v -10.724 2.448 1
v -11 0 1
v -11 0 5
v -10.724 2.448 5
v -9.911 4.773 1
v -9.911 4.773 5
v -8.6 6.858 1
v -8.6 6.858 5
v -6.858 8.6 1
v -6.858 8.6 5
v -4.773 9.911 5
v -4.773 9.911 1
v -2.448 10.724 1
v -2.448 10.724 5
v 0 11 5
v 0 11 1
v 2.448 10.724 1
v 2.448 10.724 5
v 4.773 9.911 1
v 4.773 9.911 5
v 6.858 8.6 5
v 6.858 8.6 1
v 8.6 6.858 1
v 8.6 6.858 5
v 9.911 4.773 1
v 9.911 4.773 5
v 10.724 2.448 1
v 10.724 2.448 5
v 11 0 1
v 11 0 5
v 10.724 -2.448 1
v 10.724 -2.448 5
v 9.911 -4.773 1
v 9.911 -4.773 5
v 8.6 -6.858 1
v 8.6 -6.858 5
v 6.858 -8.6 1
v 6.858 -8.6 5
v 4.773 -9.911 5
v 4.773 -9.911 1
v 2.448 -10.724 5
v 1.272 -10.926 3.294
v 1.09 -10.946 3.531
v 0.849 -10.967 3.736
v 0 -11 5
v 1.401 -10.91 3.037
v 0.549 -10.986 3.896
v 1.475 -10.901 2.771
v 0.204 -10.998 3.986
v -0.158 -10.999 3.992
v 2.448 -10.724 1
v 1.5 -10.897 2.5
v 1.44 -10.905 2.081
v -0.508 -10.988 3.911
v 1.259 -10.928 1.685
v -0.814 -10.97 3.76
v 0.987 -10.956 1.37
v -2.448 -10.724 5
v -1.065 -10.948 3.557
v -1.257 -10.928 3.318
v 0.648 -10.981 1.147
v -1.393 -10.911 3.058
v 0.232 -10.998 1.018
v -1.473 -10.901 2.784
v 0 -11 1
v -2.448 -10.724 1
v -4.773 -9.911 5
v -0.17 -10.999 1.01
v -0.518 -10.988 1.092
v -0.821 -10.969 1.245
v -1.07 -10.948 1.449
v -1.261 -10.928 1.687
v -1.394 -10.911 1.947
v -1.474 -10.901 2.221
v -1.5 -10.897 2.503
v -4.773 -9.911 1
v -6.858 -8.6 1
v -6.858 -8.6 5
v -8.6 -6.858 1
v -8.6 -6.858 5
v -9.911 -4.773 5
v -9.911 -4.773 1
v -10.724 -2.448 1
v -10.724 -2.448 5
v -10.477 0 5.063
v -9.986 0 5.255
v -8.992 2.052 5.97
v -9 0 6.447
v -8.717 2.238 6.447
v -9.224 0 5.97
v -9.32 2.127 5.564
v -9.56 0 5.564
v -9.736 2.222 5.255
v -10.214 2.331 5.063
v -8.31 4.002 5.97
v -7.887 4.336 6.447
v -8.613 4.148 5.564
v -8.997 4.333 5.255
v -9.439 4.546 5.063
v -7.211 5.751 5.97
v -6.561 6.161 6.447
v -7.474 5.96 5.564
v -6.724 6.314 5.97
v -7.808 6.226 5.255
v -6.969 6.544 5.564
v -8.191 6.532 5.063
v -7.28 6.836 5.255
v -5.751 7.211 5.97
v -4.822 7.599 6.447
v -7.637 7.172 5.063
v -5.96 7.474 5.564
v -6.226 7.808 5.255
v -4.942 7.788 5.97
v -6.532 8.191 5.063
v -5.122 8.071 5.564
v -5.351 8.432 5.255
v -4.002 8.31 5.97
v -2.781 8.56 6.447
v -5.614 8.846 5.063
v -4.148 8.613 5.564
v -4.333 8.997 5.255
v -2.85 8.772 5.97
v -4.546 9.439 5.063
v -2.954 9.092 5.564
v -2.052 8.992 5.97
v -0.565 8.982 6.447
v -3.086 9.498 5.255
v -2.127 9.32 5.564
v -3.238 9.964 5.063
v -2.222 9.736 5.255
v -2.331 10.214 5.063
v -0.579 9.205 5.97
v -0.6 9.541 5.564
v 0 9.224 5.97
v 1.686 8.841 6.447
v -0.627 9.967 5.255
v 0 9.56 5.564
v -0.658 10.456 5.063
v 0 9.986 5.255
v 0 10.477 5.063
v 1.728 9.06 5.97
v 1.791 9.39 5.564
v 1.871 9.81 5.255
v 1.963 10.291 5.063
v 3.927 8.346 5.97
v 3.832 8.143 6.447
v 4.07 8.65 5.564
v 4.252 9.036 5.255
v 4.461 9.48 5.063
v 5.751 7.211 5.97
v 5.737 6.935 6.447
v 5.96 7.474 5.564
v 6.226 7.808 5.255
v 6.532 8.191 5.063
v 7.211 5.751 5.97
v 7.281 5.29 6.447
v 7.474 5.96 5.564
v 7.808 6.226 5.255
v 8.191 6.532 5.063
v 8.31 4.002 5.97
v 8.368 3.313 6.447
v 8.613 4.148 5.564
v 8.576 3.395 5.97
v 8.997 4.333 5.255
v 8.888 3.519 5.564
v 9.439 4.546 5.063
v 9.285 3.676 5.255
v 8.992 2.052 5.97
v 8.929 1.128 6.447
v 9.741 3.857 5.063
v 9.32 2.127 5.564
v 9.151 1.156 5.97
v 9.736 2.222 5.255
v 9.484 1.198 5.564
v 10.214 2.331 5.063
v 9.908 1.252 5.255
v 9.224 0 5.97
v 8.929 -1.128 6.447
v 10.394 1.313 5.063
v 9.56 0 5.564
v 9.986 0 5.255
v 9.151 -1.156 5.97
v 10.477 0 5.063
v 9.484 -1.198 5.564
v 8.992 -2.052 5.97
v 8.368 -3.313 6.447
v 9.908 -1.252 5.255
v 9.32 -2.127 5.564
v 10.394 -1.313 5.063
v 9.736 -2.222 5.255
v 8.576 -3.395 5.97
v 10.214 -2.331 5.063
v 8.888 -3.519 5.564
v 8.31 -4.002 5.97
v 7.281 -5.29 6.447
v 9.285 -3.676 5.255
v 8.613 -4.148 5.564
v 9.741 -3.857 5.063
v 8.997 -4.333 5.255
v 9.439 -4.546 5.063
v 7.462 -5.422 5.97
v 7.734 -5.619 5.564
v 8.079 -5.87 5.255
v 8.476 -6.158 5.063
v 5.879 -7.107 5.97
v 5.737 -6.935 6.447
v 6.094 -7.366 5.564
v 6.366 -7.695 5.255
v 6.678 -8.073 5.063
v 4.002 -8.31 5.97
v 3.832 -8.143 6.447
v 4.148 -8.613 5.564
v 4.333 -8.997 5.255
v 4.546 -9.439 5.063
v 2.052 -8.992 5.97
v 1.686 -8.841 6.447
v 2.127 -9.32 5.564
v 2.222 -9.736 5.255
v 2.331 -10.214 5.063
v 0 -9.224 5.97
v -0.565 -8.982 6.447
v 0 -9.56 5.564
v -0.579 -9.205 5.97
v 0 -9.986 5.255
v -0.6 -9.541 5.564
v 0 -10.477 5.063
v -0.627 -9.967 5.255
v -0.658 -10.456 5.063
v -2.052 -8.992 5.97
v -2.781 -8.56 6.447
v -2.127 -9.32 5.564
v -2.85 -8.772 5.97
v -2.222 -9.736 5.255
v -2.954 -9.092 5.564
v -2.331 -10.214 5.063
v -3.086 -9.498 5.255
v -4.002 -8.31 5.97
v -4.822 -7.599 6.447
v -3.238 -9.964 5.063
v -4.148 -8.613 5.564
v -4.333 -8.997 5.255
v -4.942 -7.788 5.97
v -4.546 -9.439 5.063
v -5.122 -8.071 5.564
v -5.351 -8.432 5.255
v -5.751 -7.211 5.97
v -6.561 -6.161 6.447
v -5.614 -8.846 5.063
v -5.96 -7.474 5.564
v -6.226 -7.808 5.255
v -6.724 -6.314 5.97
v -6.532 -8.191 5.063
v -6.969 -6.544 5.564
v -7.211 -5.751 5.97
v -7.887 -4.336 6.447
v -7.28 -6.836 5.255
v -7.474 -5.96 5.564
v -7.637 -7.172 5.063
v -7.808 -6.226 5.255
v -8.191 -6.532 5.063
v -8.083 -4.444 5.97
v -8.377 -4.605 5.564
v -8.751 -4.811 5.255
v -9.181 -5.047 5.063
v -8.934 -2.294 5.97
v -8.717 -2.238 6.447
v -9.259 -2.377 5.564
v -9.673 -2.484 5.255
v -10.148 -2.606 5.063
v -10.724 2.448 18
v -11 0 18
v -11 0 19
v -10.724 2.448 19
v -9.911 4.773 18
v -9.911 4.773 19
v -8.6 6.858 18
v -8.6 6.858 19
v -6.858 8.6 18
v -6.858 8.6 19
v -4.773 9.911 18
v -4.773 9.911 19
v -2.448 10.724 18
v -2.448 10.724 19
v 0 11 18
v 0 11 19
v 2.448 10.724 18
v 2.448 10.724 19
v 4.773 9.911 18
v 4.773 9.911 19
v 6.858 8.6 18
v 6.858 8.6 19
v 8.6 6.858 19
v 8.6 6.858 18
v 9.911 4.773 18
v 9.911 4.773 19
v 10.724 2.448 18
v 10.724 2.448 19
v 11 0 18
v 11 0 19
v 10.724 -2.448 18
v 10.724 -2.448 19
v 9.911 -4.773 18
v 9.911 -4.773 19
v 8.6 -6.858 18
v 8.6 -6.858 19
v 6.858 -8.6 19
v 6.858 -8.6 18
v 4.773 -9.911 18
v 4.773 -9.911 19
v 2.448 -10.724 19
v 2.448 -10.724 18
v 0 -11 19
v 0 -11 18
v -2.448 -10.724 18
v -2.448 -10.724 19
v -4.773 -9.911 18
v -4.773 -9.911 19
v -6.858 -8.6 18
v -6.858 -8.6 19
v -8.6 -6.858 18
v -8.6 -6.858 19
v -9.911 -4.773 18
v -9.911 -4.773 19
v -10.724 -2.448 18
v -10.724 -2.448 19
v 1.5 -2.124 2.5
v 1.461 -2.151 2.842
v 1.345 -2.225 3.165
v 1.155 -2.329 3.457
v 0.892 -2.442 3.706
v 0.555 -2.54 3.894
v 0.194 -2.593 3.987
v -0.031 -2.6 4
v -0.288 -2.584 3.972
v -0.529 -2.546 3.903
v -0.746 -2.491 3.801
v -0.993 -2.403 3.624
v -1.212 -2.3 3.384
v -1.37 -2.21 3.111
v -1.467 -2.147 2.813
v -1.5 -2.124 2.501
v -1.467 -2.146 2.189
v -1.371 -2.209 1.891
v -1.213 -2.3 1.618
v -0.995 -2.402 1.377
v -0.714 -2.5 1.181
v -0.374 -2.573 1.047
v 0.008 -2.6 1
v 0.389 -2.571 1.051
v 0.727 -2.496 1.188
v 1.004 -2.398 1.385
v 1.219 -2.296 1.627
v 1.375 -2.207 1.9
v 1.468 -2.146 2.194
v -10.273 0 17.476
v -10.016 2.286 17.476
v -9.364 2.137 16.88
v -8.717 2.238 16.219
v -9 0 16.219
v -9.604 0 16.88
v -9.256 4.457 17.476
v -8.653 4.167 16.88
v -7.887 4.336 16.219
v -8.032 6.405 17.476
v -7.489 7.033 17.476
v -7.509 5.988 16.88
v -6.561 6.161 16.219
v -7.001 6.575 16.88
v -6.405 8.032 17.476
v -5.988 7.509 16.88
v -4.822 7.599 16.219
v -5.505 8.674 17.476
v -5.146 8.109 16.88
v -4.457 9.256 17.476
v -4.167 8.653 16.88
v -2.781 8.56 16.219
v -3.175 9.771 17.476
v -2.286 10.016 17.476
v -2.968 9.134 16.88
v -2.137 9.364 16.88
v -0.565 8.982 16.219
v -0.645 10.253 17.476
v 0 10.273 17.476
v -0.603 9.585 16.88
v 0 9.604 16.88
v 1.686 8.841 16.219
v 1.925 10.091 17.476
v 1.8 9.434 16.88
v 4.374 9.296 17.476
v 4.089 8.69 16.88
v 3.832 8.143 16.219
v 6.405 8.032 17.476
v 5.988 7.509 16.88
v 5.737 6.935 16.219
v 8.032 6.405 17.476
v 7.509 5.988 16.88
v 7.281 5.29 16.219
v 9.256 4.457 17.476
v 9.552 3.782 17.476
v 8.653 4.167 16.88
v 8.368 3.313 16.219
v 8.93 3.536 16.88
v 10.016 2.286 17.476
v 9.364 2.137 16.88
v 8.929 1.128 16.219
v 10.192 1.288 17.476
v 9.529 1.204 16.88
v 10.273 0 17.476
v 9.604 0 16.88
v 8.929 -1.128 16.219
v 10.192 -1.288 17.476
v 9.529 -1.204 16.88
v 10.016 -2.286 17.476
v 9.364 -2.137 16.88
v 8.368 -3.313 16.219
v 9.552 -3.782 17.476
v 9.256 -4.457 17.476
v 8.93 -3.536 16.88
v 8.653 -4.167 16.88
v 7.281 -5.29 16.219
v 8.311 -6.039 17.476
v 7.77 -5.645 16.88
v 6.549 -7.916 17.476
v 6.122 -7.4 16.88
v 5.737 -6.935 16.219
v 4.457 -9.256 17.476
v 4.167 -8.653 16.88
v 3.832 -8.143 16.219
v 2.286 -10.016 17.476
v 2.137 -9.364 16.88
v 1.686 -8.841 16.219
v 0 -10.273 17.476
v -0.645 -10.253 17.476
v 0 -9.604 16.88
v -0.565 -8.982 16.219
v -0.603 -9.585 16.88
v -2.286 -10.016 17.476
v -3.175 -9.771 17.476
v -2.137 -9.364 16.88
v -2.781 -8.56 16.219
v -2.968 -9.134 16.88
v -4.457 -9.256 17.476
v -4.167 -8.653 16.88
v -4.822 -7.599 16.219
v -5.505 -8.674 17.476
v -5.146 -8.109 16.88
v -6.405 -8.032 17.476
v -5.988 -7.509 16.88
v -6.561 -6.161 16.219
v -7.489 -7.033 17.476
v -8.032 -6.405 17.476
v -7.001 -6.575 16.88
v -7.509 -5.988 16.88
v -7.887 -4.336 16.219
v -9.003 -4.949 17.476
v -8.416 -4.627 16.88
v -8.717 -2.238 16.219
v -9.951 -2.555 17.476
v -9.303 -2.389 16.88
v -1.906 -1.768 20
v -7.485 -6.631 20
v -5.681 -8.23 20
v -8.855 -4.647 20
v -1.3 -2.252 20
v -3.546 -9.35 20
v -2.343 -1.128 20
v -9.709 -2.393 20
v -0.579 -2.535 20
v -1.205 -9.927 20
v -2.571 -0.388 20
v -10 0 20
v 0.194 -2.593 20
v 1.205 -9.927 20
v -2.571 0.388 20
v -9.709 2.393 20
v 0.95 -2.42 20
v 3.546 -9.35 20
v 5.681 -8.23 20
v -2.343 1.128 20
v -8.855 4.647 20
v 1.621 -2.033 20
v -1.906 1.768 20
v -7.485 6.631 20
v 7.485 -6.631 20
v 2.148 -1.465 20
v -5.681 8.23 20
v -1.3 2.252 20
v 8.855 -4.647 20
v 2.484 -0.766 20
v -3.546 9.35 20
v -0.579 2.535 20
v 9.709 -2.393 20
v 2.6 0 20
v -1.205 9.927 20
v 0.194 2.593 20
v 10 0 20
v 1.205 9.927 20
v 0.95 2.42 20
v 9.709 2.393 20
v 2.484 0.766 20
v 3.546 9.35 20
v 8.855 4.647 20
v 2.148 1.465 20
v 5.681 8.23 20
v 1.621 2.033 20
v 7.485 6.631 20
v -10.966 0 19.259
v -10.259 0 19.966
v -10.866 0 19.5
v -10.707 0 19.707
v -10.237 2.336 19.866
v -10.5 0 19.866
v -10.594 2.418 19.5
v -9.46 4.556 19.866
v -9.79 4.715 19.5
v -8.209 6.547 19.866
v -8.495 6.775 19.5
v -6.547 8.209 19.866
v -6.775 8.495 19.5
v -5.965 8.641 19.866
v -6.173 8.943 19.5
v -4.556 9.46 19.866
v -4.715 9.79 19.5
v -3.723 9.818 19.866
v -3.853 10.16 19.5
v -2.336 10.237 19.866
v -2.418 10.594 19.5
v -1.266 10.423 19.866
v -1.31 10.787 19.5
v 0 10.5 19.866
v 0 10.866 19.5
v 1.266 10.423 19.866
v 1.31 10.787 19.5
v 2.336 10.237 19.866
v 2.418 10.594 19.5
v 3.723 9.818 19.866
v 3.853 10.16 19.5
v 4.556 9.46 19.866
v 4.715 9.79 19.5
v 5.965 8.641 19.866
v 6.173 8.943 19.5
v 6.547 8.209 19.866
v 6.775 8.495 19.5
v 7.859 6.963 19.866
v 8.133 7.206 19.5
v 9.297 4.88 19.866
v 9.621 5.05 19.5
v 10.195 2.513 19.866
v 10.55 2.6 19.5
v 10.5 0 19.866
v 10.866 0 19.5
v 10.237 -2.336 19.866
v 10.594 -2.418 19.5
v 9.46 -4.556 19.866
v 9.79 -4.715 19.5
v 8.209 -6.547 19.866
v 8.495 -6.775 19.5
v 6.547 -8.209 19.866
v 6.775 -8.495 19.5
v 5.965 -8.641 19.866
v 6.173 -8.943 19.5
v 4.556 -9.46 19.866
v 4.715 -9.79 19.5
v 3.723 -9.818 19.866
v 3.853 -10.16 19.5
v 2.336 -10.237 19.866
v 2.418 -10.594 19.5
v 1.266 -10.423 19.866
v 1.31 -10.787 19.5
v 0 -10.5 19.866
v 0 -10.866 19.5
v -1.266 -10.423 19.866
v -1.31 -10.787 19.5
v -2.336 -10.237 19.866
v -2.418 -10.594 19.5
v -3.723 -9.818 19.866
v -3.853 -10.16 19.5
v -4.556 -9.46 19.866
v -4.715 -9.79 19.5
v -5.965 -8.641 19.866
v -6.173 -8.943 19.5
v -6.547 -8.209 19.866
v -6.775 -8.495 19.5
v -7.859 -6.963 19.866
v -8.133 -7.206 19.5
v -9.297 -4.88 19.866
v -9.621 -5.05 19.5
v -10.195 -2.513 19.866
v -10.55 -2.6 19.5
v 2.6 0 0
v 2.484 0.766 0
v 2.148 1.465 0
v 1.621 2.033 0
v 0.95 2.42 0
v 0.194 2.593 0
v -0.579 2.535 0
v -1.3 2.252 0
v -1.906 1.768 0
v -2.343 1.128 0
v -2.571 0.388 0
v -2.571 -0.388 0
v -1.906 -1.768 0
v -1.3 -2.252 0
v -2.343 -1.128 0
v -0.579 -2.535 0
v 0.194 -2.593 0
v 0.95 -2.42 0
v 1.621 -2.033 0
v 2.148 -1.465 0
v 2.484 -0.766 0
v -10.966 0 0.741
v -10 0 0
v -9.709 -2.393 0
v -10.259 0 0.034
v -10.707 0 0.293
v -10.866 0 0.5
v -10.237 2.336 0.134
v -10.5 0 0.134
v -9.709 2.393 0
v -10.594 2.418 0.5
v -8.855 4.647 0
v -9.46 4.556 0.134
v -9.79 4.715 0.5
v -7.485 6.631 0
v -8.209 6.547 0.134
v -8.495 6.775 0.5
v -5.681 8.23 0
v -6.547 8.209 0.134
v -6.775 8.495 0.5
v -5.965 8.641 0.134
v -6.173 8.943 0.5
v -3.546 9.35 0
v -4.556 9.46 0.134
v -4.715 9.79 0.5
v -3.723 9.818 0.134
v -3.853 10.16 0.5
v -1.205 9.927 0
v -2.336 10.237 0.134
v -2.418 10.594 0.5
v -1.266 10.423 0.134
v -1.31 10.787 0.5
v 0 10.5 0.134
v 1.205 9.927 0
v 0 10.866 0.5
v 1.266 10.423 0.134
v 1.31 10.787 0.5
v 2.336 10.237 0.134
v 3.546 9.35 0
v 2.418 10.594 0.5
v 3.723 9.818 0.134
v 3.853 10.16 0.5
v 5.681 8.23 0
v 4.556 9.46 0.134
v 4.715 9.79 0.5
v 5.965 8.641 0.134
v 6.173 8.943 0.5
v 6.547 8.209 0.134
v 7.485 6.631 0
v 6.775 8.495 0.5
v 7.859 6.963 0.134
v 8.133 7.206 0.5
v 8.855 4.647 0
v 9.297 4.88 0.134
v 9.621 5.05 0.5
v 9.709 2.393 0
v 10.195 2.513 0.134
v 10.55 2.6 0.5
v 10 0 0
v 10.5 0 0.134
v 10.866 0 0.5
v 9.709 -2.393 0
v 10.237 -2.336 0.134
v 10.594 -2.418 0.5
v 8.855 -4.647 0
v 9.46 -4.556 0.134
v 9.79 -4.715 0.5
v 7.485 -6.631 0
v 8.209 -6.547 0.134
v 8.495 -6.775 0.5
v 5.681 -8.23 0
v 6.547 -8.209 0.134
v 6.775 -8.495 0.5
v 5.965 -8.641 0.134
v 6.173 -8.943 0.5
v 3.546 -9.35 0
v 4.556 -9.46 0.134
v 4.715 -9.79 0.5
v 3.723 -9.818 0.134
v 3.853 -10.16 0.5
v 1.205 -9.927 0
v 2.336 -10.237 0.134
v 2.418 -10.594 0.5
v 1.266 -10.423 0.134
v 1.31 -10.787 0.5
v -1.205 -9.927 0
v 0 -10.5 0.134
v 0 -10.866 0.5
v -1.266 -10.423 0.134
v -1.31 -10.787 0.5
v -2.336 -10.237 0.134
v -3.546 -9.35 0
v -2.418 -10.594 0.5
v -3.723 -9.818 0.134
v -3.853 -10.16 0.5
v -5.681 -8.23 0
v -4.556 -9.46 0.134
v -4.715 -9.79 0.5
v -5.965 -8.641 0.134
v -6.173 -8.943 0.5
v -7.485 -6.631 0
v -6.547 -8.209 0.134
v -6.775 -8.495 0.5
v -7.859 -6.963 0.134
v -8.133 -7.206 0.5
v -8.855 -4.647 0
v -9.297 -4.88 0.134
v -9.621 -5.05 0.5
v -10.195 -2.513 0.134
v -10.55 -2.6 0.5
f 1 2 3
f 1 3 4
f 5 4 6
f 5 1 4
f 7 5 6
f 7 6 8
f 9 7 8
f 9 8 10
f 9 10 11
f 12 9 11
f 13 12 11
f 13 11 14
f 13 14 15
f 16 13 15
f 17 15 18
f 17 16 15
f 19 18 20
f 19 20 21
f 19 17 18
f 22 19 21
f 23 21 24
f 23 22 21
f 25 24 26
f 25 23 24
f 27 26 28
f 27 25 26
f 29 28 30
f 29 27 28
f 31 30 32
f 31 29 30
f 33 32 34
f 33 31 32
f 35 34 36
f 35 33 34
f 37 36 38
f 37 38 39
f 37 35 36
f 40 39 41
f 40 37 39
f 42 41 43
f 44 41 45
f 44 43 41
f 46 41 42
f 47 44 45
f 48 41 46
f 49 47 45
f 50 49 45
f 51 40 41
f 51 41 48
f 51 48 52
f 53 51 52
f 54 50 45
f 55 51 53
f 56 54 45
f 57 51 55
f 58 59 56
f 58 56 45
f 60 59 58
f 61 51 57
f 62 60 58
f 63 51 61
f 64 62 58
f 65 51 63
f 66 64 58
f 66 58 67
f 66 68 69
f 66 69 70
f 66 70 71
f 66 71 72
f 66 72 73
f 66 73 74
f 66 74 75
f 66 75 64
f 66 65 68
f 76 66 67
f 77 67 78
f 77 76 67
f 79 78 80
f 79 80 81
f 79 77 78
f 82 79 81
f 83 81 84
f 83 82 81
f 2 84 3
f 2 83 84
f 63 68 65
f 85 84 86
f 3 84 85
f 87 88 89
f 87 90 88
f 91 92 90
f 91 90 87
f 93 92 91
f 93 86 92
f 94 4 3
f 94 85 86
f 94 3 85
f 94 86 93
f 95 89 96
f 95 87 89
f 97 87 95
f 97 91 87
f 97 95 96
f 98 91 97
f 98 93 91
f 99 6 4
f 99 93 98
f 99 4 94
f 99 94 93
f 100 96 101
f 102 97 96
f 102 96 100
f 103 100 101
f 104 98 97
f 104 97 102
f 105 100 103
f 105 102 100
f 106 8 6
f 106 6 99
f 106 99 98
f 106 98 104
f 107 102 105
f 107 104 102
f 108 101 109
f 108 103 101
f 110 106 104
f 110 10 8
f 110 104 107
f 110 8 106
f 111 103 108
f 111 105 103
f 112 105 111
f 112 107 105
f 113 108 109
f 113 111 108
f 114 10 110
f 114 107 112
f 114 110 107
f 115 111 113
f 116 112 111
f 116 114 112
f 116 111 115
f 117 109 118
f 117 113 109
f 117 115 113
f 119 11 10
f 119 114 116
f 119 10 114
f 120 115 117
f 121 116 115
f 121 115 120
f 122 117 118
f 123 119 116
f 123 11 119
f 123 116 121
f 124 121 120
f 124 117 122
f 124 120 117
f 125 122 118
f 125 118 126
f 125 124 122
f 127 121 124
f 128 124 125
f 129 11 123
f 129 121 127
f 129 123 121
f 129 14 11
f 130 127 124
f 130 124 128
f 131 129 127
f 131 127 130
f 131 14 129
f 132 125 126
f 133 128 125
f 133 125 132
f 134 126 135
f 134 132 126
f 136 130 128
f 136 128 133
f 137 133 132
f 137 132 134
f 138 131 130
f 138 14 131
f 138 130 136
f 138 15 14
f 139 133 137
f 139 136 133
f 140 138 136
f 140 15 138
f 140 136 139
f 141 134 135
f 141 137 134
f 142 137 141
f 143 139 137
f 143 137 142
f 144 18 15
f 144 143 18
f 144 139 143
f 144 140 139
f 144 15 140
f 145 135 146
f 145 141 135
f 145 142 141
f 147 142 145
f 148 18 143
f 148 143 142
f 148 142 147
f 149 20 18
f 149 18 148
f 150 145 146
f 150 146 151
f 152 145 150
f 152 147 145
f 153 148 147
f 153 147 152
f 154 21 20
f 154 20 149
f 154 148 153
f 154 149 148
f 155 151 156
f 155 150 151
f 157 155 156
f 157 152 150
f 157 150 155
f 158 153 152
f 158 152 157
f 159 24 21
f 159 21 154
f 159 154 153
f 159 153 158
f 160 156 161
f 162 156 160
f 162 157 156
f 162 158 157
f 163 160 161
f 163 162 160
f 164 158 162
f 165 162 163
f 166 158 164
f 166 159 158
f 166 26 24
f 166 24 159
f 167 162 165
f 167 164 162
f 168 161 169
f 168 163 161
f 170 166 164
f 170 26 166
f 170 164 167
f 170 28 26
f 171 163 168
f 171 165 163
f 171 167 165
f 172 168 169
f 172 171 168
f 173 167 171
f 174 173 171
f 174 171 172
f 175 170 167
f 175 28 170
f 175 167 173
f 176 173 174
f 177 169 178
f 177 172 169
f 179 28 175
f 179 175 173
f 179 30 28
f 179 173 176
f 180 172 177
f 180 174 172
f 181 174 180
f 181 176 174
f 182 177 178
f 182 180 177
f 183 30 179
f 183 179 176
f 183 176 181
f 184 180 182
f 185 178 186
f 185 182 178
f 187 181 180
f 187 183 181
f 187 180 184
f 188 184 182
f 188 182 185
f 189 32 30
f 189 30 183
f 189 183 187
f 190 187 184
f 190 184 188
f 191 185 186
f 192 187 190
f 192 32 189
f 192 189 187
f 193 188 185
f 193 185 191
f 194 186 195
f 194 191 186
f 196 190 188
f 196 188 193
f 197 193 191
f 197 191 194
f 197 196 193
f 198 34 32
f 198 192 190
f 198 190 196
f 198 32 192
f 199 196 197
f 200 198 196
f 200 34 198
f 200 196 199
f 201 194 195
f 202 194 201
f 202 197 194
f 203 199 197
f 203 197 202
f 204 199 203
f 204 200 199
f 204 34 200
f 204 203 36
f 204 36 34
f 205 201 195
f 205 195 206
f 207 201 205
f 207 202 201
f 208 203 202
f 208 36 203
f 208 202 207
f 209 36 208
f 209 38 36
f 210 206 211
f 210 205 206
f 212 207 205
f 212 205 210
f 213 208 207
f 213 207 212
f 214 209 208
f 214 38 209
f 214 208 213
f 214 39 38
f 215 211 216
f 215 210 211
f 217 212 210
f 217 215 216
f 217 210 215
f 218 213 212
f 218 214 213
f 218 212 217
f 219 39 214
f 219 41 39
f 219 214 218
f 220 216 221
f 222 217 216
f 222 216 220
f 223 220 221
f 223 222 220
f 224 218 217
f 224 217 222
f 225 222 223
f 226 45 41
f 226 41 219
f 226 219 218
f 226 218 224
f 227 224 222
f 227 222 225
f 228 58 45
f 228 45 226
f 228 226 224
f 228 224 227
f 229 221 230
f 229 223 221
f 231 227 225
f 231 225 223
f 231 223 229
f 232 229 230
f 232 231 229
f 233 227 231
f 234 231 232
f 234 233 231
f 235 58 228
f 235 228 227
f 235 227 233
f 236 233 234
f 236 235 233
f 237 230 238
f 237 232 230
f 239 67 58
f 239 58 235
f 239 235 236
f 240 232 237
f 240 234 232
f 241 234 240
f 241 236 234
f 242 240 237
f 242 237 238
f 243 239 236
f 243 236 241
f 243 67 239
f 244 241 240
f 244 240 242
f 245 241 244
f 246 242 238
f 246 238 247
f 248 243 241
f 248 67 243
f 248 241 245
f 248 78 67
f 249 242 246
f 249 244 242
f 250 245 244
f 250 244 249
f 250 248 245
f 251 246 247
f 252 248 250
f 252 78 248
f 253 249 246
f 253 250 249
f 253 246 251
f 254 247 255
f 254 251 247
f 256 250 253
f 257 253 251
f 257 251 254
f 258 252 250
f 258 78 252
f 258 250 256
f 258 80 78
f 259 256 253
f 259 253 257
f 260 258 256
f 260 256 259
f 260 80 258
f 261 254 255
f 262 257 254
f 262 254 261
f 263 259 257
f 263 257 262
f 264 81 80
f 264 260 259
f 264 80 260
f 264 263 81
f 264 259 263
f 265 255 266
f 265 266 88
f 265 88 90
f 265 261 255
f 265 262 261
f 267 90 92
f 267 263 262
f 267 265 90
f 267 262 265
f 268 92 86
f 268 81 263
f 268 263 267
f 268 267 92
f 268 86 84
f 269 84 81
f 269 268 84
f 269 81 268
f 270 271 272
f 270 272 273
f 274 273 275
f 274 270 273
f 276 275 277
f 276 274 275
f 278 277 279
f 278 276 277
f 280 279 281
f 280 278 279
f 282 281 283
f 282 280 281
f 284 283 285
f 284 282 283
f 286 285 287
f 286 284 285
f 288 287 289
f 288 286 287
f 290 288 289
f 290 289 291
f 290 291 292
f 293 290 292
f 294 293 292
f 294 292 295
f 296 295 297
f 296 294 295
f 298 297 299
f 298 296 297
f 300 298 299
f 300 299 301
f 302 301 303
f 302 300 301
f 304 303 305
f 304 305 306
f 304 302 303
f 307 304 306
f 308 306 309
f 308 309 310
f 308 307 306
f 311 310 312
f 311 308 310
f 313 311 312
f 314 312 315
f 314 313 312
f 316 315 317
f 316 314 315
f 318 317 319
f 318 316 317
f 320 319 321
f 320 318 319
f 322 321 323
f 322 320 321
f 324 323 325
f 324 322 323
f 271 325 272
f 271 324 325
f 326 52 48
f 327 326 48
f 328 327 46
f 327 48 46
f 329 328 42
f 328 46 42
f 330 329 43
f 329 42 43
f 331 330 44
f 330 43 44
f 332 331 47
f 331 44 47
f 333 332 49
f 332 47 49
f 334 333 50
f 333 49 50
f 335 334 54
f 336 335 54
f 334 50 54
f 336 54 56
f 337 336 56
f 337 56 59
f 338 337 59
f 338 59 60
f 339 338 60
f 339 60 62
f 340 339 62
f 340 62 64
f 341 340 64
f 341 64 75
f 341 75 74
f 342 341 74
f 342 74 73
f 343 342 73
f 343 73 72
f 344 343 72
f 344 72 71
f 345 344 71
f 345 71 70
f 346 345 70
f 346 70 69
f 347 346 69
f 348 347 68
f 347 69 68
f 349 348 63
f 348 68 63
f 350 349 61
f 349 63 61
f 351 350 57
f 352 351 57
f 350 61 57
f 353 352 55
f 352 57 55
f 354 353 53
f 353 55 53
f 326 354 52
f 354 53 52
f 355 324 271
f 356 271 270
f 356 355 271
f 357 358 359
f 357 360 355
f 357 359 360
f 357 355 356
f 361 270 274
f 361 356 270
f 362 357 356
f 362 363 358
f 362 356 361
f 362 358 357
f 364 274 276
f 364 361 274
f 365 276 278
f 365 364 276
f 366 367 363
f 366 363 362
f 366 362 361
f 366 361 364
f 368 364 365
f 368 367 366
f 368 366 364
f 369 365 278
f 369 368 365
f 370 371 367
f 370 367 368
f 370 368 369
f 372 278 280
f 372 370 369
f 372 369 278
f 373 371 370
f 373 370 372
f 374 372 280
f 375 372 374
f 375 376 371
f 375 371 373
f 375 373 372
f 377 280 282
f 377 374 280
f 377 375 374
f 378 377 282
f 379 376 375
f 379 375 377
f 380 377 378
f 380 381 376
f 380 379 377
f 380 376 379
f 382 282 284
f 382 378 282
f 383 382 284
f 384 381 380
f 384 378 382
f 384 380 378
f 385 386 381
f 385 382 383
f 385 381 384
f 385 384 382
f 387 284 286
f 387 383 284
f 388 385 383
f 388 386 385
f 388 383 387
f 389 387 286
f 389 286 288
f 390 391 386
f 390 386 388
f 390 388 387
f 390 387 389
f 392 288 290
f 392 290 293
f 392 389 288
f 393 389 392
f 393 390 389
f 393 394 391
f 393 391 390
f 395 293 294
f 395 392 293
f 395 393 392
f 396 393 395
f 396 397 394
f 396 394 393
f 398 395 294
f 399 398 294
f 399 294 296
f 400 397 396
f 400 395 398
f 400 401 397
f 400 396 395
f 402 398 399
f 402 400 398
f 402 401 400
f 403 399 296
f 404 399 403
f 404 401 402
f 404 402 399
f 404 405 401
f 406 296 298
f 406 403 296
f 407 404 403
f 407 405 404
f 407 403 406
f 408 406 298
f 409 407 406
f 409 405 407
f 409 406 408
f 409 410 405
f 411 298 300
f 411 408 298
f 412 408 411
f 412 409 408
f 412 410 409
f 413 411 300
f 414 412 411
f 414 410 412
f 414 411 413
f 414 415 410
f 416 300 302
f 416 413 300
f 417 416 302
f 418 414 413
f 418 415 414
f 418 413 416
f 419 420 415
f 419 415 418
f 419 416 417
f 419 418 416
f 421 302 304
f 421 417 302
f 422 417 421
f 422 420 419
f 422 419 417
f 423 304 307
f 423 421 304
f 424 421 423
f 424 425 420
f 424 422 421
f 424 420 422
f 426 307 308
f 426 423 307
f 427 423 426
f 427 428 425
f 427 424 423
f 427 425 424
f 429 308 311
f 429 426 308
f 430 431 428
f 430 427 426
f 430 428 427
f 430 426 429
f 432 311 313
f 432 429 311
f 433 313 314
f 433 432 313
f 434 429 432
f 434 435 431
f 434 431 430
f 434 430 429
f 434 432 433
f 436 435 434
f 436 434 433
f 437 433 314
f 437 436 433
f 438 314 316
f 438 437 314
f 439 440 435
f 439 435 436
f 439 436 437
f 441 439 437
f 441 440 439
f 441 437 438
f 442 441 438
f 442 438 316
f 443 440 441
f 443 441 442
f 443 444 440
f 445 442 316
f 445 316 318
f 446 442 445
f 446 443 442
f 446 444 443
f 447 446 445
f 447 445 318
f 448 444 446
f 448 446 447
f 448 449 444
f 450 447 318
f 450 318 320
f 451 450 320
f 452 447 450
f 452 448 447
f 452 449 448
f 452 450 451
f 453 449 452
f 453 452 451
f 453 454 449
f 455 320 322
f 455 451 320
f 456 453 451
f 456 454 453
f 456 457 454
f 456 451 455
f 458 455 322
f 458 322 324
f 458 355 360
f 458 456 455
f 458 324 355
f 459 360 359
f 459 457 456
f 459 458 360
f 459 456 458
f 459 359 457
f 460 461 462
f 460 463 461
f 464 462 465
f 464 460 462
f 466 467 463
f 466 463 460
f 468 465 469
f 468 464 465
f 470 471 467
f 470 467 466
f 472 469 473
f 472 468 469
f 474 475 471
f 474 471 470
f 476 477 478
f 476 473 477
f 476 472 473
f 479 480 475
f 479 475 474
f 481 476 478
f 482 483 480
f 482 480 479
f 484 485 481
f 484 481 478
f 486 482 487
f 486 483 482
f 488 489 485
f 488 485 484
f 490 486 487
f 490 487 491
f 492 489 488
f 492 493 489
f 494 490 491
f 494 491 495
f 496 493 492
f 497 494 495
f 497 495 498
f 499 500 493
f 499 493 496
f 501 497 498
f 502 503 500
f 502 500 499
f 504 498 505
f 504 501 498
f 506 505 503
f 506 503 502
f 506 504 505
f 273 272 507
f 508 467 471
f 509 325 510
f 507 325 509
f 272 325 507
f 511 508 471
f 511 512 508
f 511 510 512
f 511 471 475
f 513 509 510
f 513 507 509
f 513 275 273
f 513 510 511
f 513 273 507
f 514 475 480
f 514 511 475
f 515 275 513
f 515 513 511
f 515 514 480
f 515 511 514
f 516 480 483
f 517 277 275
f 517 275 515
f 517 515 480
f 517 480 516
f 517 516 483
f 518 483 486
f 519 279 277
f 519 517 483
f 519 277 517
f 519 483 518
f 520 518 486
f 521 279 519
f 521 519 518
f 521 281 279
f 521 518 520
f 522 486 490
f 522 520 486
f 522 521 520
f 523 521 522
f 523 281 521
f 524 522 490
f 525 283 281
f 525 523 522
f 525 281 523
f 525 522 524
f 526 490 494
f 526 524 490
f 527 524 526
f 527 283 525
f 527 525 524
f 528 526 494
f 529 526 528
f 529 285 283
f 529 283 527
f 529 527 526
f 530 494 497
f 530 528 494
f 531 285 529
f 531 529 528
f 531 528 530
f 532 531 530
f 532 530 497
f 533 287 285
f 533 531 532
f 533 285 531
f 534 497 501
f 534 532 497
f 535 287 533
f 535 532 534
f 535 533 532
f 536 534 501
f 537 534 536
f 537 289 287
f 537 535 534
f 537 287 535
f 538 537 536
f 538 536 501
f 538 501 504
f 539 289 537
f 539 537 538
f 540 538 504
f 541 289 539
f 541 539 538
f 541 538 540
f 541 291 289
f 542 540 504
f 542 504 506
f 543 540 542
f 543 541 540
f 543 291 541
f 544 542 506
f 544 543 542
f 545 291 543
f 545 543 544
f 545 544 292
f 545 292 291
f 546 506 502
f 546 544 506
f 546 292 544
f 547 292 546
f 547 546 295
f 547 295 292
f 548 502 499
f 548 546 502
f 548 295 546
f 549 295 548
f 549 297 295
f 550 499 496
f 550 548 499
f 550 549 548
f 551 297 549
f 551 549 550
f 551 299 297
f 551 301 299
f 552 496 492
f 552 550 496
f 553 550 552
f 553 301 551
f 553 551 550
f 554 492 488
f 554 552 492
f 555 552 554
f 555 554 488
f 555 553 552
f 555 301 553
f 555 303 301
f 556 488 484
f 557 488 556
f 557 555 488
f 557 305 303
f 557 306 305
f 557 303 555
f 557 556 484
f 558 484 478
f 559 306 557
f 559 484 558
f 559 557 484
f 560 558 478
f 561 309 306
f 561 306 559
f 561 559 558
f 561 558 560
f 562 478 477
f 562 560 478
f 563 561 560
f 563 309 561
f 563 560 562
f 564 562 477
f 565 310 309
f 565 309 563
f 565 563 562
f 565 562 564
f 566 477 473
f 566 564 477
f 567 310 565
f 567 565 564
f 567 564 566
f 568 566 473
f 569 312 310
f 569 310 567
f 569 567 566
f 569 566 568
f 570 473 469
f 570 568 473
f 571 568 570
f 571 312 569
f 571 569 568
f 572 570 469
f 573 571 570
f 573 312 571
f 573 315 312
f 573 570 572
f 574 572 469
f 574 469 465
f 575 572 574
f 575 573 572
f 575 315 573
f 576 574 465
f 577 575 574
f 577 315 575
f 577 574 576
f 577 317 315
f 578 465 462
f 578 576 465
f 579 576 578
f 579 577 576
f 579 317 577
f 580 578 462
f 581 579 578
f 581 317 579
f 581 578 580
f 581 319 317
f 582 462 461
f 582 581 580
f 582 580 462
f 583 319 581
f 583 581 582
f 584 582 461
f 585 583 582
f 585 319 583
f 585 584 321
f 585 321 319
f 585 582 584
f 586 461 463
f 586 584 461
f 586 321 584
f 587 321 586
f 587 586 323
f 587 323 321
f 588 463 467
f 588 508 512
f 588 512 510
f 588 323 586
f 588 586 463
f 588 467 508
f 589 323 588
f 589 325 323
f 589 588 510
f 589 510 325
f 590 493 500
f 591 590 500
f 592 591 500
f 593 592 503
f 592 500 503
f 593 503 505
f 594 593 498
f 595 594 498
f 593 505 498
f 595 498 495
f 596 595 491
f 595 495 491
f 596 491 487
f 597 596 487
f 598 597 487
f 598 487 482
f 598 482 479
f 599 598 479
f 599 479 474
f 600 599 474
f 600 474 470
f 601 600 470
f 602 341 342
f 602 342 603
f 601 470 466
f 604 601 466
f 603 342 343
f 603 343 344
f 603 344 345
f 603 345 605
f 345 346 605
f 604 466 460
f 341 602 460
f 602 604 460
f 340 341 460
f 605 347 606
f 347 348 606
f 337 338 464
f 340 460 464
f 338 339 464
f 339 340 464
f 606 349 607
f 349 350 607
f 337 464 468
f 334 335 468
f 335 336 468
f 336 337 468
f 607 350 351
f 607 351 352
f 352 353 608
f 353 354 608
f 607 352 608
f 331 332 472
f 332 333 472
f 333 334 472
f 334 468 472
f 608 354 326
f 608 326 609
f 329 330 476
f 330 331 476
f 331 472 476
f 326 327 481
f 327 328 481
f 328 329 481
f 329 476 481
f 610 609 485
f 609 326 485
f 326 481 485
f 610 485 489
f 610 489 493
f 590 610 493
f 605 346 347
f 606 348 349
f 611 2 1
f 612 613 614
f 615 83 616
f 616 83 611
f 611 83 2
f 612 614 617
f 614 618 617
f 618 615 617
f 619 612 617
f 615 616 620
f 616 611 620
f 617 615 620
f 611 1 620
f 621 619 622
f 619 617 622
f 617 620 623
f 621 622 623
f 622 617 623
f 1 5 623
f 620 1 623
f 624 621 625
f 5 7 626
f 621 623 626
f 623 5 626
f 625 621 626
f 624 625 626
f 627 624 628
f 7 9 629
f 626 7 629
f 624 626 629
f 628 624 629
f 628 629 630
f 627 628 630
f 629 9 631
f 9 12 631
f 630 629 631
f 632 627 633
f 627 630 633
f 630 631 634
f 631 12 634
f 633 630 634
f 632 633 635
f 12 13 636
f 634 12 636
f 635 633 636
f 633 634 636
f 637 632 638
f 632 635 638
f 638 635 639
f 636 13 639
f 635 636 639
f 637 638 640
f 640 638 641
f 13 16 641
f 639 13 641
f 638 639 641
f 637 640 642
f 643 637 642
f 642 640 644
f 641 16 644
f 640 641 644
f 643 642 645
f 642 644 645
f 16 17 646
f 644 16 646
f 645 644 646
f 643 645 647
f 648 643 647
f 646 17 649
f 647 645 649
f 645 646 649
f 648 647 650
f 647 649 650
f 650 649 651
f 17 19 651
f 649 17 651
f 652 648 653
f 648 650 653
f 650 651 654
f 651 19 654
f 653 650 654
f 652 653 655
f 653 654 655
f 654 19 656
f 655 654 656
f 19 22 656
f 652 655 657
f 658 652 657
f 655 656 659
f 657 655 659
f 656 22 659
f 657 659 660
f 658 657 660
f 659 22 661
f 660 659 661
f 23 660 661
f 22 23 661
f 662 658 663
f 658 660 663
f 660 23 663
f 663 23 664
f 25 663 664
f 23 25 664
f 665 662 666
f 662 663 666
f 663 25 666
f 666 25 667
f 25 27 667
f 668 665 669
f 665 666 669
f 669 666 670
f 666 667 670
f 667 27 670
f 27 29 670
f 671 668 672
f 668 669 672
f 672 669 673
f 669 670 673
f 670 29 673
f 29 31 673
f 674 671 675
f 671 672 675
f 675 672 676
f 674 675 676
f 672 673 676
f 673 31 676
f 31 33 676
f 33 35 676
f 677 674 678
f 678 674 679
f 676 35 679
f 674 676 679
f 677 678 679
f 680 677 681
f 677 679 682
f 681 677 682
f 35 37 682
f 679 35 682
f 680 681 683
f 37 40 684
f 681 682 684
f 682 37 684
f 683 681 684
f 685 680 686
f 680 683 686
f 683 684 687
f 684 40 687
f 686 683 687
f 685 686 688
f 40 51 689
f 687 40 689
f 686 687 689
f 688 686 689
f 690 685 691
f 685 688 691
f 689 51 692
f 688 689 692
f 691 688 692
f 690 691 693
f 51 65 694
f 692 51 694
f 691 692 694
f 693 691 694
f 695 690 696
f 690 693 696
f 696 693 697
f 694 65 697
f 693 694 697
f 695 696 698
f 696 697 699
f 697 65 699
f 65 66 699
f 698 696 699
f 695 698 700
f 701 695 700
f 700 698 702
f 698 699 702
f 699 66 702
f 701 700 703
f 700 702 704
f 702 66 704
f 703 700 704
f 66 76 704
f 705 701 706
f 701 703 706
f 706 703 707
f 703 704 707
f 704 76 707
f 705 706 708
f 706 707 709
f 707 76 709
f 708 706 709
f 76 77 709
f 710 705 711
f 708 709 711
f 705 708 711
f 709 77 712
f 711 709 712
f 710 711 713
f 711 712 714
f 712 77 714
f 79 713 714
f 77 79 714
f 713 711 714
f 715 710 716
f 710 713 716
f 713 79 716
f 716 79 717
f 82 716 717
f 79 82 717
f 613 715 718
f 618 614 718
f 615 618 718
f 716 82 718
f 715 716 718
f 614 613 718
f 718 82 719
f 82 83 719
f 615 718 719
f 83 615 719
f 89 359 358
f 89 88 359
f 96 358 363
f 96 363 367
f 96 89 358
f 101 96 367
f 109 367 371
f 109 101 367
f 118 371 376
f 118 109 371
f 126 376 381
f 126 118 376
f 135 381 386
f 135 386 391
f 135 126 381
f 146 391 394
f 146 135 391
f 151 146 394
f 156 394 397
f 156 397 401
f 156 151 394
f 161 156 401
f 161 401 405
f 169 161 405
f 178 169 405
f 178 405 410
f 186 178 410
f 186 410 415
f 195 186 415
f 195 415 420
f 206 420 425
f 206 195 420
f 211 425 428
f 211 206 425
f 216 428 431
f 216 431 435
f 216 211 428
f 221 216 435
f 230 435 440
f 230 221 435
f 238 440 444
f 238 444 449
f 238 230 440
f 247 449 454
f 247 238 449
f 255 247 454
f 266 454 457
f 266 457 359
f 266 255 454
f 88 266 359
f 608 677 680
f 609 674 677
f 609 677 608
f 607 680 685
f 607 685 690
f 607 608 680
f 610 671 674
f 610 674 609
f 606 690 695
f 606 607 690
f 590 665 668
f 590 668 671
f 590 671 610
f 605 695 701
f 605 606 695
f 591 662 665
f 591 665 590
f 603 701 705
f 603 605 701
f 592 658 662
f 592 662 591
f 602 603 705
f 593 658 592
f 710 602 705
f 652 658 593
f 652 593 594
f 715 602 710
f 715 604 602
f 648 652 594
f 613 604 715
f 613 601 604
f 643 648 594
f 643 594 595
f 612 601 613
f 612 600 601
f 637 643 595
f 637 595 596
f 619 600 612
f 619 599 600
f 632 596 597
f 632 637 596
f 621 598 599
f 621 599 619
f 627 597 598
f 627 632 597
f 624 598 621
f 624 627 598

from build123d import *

# Parameters (mm, degrees)
F2_R     = 2.6
F3_DEPTH = 20
F5_R     = 1.5
F6_DEPTH = 10
F7_R     = 1


with BuildPart() as f1:
    # F0 (on Front) → F1 (revolve)
    with BuildSketch(Plane.XZ):
        with BuildLine():
            Line((-11, 0), (0, 0))
            Line((0, 0), (0, 20))
            Line((0, 20), (-11, 20))
            Line((-11, 20), (-11, 18))
            ThreePointArc((-11, 18), (-9.931221, 17.186703), (-9, 16.218938))
            Line((-9, 16.218938), (-9, 6.446878))
            ThreePointArc((-9, 6.446878), (-9.763254, 5.396188), (-11, 5))
            Line((-11, 5), (-11, 0))
        make_face()
    revolve(axis=Axis((0, 0, 10), (0, 0, -1)))

    # F2 (on face) → F3 (cut)
    with BuildSketch(Plane.XY.offset(20)):
        Circle(F2_R)
    extrude(amount=-F3_DEPTH, mode=Mode.SUBTRACT)

    # F5 (on offset) → F6 (cut)
    with BuildSketch(Plane.XZ.offset(11)):
        with Locations((0, 2.5)):
            Circle(F5_R)
    extrude(amount=-F6_DEPTH, mode=Mode.SUBTRACT)

    # F7
    f7_edges = [f1.edges().sort_by_distance(p)[0] for p in [
        (11, 0, 20),
        (11, 0, 0),
    ]]
    fillet(f7_edges, radius=F7_R)


solid = f1.part
